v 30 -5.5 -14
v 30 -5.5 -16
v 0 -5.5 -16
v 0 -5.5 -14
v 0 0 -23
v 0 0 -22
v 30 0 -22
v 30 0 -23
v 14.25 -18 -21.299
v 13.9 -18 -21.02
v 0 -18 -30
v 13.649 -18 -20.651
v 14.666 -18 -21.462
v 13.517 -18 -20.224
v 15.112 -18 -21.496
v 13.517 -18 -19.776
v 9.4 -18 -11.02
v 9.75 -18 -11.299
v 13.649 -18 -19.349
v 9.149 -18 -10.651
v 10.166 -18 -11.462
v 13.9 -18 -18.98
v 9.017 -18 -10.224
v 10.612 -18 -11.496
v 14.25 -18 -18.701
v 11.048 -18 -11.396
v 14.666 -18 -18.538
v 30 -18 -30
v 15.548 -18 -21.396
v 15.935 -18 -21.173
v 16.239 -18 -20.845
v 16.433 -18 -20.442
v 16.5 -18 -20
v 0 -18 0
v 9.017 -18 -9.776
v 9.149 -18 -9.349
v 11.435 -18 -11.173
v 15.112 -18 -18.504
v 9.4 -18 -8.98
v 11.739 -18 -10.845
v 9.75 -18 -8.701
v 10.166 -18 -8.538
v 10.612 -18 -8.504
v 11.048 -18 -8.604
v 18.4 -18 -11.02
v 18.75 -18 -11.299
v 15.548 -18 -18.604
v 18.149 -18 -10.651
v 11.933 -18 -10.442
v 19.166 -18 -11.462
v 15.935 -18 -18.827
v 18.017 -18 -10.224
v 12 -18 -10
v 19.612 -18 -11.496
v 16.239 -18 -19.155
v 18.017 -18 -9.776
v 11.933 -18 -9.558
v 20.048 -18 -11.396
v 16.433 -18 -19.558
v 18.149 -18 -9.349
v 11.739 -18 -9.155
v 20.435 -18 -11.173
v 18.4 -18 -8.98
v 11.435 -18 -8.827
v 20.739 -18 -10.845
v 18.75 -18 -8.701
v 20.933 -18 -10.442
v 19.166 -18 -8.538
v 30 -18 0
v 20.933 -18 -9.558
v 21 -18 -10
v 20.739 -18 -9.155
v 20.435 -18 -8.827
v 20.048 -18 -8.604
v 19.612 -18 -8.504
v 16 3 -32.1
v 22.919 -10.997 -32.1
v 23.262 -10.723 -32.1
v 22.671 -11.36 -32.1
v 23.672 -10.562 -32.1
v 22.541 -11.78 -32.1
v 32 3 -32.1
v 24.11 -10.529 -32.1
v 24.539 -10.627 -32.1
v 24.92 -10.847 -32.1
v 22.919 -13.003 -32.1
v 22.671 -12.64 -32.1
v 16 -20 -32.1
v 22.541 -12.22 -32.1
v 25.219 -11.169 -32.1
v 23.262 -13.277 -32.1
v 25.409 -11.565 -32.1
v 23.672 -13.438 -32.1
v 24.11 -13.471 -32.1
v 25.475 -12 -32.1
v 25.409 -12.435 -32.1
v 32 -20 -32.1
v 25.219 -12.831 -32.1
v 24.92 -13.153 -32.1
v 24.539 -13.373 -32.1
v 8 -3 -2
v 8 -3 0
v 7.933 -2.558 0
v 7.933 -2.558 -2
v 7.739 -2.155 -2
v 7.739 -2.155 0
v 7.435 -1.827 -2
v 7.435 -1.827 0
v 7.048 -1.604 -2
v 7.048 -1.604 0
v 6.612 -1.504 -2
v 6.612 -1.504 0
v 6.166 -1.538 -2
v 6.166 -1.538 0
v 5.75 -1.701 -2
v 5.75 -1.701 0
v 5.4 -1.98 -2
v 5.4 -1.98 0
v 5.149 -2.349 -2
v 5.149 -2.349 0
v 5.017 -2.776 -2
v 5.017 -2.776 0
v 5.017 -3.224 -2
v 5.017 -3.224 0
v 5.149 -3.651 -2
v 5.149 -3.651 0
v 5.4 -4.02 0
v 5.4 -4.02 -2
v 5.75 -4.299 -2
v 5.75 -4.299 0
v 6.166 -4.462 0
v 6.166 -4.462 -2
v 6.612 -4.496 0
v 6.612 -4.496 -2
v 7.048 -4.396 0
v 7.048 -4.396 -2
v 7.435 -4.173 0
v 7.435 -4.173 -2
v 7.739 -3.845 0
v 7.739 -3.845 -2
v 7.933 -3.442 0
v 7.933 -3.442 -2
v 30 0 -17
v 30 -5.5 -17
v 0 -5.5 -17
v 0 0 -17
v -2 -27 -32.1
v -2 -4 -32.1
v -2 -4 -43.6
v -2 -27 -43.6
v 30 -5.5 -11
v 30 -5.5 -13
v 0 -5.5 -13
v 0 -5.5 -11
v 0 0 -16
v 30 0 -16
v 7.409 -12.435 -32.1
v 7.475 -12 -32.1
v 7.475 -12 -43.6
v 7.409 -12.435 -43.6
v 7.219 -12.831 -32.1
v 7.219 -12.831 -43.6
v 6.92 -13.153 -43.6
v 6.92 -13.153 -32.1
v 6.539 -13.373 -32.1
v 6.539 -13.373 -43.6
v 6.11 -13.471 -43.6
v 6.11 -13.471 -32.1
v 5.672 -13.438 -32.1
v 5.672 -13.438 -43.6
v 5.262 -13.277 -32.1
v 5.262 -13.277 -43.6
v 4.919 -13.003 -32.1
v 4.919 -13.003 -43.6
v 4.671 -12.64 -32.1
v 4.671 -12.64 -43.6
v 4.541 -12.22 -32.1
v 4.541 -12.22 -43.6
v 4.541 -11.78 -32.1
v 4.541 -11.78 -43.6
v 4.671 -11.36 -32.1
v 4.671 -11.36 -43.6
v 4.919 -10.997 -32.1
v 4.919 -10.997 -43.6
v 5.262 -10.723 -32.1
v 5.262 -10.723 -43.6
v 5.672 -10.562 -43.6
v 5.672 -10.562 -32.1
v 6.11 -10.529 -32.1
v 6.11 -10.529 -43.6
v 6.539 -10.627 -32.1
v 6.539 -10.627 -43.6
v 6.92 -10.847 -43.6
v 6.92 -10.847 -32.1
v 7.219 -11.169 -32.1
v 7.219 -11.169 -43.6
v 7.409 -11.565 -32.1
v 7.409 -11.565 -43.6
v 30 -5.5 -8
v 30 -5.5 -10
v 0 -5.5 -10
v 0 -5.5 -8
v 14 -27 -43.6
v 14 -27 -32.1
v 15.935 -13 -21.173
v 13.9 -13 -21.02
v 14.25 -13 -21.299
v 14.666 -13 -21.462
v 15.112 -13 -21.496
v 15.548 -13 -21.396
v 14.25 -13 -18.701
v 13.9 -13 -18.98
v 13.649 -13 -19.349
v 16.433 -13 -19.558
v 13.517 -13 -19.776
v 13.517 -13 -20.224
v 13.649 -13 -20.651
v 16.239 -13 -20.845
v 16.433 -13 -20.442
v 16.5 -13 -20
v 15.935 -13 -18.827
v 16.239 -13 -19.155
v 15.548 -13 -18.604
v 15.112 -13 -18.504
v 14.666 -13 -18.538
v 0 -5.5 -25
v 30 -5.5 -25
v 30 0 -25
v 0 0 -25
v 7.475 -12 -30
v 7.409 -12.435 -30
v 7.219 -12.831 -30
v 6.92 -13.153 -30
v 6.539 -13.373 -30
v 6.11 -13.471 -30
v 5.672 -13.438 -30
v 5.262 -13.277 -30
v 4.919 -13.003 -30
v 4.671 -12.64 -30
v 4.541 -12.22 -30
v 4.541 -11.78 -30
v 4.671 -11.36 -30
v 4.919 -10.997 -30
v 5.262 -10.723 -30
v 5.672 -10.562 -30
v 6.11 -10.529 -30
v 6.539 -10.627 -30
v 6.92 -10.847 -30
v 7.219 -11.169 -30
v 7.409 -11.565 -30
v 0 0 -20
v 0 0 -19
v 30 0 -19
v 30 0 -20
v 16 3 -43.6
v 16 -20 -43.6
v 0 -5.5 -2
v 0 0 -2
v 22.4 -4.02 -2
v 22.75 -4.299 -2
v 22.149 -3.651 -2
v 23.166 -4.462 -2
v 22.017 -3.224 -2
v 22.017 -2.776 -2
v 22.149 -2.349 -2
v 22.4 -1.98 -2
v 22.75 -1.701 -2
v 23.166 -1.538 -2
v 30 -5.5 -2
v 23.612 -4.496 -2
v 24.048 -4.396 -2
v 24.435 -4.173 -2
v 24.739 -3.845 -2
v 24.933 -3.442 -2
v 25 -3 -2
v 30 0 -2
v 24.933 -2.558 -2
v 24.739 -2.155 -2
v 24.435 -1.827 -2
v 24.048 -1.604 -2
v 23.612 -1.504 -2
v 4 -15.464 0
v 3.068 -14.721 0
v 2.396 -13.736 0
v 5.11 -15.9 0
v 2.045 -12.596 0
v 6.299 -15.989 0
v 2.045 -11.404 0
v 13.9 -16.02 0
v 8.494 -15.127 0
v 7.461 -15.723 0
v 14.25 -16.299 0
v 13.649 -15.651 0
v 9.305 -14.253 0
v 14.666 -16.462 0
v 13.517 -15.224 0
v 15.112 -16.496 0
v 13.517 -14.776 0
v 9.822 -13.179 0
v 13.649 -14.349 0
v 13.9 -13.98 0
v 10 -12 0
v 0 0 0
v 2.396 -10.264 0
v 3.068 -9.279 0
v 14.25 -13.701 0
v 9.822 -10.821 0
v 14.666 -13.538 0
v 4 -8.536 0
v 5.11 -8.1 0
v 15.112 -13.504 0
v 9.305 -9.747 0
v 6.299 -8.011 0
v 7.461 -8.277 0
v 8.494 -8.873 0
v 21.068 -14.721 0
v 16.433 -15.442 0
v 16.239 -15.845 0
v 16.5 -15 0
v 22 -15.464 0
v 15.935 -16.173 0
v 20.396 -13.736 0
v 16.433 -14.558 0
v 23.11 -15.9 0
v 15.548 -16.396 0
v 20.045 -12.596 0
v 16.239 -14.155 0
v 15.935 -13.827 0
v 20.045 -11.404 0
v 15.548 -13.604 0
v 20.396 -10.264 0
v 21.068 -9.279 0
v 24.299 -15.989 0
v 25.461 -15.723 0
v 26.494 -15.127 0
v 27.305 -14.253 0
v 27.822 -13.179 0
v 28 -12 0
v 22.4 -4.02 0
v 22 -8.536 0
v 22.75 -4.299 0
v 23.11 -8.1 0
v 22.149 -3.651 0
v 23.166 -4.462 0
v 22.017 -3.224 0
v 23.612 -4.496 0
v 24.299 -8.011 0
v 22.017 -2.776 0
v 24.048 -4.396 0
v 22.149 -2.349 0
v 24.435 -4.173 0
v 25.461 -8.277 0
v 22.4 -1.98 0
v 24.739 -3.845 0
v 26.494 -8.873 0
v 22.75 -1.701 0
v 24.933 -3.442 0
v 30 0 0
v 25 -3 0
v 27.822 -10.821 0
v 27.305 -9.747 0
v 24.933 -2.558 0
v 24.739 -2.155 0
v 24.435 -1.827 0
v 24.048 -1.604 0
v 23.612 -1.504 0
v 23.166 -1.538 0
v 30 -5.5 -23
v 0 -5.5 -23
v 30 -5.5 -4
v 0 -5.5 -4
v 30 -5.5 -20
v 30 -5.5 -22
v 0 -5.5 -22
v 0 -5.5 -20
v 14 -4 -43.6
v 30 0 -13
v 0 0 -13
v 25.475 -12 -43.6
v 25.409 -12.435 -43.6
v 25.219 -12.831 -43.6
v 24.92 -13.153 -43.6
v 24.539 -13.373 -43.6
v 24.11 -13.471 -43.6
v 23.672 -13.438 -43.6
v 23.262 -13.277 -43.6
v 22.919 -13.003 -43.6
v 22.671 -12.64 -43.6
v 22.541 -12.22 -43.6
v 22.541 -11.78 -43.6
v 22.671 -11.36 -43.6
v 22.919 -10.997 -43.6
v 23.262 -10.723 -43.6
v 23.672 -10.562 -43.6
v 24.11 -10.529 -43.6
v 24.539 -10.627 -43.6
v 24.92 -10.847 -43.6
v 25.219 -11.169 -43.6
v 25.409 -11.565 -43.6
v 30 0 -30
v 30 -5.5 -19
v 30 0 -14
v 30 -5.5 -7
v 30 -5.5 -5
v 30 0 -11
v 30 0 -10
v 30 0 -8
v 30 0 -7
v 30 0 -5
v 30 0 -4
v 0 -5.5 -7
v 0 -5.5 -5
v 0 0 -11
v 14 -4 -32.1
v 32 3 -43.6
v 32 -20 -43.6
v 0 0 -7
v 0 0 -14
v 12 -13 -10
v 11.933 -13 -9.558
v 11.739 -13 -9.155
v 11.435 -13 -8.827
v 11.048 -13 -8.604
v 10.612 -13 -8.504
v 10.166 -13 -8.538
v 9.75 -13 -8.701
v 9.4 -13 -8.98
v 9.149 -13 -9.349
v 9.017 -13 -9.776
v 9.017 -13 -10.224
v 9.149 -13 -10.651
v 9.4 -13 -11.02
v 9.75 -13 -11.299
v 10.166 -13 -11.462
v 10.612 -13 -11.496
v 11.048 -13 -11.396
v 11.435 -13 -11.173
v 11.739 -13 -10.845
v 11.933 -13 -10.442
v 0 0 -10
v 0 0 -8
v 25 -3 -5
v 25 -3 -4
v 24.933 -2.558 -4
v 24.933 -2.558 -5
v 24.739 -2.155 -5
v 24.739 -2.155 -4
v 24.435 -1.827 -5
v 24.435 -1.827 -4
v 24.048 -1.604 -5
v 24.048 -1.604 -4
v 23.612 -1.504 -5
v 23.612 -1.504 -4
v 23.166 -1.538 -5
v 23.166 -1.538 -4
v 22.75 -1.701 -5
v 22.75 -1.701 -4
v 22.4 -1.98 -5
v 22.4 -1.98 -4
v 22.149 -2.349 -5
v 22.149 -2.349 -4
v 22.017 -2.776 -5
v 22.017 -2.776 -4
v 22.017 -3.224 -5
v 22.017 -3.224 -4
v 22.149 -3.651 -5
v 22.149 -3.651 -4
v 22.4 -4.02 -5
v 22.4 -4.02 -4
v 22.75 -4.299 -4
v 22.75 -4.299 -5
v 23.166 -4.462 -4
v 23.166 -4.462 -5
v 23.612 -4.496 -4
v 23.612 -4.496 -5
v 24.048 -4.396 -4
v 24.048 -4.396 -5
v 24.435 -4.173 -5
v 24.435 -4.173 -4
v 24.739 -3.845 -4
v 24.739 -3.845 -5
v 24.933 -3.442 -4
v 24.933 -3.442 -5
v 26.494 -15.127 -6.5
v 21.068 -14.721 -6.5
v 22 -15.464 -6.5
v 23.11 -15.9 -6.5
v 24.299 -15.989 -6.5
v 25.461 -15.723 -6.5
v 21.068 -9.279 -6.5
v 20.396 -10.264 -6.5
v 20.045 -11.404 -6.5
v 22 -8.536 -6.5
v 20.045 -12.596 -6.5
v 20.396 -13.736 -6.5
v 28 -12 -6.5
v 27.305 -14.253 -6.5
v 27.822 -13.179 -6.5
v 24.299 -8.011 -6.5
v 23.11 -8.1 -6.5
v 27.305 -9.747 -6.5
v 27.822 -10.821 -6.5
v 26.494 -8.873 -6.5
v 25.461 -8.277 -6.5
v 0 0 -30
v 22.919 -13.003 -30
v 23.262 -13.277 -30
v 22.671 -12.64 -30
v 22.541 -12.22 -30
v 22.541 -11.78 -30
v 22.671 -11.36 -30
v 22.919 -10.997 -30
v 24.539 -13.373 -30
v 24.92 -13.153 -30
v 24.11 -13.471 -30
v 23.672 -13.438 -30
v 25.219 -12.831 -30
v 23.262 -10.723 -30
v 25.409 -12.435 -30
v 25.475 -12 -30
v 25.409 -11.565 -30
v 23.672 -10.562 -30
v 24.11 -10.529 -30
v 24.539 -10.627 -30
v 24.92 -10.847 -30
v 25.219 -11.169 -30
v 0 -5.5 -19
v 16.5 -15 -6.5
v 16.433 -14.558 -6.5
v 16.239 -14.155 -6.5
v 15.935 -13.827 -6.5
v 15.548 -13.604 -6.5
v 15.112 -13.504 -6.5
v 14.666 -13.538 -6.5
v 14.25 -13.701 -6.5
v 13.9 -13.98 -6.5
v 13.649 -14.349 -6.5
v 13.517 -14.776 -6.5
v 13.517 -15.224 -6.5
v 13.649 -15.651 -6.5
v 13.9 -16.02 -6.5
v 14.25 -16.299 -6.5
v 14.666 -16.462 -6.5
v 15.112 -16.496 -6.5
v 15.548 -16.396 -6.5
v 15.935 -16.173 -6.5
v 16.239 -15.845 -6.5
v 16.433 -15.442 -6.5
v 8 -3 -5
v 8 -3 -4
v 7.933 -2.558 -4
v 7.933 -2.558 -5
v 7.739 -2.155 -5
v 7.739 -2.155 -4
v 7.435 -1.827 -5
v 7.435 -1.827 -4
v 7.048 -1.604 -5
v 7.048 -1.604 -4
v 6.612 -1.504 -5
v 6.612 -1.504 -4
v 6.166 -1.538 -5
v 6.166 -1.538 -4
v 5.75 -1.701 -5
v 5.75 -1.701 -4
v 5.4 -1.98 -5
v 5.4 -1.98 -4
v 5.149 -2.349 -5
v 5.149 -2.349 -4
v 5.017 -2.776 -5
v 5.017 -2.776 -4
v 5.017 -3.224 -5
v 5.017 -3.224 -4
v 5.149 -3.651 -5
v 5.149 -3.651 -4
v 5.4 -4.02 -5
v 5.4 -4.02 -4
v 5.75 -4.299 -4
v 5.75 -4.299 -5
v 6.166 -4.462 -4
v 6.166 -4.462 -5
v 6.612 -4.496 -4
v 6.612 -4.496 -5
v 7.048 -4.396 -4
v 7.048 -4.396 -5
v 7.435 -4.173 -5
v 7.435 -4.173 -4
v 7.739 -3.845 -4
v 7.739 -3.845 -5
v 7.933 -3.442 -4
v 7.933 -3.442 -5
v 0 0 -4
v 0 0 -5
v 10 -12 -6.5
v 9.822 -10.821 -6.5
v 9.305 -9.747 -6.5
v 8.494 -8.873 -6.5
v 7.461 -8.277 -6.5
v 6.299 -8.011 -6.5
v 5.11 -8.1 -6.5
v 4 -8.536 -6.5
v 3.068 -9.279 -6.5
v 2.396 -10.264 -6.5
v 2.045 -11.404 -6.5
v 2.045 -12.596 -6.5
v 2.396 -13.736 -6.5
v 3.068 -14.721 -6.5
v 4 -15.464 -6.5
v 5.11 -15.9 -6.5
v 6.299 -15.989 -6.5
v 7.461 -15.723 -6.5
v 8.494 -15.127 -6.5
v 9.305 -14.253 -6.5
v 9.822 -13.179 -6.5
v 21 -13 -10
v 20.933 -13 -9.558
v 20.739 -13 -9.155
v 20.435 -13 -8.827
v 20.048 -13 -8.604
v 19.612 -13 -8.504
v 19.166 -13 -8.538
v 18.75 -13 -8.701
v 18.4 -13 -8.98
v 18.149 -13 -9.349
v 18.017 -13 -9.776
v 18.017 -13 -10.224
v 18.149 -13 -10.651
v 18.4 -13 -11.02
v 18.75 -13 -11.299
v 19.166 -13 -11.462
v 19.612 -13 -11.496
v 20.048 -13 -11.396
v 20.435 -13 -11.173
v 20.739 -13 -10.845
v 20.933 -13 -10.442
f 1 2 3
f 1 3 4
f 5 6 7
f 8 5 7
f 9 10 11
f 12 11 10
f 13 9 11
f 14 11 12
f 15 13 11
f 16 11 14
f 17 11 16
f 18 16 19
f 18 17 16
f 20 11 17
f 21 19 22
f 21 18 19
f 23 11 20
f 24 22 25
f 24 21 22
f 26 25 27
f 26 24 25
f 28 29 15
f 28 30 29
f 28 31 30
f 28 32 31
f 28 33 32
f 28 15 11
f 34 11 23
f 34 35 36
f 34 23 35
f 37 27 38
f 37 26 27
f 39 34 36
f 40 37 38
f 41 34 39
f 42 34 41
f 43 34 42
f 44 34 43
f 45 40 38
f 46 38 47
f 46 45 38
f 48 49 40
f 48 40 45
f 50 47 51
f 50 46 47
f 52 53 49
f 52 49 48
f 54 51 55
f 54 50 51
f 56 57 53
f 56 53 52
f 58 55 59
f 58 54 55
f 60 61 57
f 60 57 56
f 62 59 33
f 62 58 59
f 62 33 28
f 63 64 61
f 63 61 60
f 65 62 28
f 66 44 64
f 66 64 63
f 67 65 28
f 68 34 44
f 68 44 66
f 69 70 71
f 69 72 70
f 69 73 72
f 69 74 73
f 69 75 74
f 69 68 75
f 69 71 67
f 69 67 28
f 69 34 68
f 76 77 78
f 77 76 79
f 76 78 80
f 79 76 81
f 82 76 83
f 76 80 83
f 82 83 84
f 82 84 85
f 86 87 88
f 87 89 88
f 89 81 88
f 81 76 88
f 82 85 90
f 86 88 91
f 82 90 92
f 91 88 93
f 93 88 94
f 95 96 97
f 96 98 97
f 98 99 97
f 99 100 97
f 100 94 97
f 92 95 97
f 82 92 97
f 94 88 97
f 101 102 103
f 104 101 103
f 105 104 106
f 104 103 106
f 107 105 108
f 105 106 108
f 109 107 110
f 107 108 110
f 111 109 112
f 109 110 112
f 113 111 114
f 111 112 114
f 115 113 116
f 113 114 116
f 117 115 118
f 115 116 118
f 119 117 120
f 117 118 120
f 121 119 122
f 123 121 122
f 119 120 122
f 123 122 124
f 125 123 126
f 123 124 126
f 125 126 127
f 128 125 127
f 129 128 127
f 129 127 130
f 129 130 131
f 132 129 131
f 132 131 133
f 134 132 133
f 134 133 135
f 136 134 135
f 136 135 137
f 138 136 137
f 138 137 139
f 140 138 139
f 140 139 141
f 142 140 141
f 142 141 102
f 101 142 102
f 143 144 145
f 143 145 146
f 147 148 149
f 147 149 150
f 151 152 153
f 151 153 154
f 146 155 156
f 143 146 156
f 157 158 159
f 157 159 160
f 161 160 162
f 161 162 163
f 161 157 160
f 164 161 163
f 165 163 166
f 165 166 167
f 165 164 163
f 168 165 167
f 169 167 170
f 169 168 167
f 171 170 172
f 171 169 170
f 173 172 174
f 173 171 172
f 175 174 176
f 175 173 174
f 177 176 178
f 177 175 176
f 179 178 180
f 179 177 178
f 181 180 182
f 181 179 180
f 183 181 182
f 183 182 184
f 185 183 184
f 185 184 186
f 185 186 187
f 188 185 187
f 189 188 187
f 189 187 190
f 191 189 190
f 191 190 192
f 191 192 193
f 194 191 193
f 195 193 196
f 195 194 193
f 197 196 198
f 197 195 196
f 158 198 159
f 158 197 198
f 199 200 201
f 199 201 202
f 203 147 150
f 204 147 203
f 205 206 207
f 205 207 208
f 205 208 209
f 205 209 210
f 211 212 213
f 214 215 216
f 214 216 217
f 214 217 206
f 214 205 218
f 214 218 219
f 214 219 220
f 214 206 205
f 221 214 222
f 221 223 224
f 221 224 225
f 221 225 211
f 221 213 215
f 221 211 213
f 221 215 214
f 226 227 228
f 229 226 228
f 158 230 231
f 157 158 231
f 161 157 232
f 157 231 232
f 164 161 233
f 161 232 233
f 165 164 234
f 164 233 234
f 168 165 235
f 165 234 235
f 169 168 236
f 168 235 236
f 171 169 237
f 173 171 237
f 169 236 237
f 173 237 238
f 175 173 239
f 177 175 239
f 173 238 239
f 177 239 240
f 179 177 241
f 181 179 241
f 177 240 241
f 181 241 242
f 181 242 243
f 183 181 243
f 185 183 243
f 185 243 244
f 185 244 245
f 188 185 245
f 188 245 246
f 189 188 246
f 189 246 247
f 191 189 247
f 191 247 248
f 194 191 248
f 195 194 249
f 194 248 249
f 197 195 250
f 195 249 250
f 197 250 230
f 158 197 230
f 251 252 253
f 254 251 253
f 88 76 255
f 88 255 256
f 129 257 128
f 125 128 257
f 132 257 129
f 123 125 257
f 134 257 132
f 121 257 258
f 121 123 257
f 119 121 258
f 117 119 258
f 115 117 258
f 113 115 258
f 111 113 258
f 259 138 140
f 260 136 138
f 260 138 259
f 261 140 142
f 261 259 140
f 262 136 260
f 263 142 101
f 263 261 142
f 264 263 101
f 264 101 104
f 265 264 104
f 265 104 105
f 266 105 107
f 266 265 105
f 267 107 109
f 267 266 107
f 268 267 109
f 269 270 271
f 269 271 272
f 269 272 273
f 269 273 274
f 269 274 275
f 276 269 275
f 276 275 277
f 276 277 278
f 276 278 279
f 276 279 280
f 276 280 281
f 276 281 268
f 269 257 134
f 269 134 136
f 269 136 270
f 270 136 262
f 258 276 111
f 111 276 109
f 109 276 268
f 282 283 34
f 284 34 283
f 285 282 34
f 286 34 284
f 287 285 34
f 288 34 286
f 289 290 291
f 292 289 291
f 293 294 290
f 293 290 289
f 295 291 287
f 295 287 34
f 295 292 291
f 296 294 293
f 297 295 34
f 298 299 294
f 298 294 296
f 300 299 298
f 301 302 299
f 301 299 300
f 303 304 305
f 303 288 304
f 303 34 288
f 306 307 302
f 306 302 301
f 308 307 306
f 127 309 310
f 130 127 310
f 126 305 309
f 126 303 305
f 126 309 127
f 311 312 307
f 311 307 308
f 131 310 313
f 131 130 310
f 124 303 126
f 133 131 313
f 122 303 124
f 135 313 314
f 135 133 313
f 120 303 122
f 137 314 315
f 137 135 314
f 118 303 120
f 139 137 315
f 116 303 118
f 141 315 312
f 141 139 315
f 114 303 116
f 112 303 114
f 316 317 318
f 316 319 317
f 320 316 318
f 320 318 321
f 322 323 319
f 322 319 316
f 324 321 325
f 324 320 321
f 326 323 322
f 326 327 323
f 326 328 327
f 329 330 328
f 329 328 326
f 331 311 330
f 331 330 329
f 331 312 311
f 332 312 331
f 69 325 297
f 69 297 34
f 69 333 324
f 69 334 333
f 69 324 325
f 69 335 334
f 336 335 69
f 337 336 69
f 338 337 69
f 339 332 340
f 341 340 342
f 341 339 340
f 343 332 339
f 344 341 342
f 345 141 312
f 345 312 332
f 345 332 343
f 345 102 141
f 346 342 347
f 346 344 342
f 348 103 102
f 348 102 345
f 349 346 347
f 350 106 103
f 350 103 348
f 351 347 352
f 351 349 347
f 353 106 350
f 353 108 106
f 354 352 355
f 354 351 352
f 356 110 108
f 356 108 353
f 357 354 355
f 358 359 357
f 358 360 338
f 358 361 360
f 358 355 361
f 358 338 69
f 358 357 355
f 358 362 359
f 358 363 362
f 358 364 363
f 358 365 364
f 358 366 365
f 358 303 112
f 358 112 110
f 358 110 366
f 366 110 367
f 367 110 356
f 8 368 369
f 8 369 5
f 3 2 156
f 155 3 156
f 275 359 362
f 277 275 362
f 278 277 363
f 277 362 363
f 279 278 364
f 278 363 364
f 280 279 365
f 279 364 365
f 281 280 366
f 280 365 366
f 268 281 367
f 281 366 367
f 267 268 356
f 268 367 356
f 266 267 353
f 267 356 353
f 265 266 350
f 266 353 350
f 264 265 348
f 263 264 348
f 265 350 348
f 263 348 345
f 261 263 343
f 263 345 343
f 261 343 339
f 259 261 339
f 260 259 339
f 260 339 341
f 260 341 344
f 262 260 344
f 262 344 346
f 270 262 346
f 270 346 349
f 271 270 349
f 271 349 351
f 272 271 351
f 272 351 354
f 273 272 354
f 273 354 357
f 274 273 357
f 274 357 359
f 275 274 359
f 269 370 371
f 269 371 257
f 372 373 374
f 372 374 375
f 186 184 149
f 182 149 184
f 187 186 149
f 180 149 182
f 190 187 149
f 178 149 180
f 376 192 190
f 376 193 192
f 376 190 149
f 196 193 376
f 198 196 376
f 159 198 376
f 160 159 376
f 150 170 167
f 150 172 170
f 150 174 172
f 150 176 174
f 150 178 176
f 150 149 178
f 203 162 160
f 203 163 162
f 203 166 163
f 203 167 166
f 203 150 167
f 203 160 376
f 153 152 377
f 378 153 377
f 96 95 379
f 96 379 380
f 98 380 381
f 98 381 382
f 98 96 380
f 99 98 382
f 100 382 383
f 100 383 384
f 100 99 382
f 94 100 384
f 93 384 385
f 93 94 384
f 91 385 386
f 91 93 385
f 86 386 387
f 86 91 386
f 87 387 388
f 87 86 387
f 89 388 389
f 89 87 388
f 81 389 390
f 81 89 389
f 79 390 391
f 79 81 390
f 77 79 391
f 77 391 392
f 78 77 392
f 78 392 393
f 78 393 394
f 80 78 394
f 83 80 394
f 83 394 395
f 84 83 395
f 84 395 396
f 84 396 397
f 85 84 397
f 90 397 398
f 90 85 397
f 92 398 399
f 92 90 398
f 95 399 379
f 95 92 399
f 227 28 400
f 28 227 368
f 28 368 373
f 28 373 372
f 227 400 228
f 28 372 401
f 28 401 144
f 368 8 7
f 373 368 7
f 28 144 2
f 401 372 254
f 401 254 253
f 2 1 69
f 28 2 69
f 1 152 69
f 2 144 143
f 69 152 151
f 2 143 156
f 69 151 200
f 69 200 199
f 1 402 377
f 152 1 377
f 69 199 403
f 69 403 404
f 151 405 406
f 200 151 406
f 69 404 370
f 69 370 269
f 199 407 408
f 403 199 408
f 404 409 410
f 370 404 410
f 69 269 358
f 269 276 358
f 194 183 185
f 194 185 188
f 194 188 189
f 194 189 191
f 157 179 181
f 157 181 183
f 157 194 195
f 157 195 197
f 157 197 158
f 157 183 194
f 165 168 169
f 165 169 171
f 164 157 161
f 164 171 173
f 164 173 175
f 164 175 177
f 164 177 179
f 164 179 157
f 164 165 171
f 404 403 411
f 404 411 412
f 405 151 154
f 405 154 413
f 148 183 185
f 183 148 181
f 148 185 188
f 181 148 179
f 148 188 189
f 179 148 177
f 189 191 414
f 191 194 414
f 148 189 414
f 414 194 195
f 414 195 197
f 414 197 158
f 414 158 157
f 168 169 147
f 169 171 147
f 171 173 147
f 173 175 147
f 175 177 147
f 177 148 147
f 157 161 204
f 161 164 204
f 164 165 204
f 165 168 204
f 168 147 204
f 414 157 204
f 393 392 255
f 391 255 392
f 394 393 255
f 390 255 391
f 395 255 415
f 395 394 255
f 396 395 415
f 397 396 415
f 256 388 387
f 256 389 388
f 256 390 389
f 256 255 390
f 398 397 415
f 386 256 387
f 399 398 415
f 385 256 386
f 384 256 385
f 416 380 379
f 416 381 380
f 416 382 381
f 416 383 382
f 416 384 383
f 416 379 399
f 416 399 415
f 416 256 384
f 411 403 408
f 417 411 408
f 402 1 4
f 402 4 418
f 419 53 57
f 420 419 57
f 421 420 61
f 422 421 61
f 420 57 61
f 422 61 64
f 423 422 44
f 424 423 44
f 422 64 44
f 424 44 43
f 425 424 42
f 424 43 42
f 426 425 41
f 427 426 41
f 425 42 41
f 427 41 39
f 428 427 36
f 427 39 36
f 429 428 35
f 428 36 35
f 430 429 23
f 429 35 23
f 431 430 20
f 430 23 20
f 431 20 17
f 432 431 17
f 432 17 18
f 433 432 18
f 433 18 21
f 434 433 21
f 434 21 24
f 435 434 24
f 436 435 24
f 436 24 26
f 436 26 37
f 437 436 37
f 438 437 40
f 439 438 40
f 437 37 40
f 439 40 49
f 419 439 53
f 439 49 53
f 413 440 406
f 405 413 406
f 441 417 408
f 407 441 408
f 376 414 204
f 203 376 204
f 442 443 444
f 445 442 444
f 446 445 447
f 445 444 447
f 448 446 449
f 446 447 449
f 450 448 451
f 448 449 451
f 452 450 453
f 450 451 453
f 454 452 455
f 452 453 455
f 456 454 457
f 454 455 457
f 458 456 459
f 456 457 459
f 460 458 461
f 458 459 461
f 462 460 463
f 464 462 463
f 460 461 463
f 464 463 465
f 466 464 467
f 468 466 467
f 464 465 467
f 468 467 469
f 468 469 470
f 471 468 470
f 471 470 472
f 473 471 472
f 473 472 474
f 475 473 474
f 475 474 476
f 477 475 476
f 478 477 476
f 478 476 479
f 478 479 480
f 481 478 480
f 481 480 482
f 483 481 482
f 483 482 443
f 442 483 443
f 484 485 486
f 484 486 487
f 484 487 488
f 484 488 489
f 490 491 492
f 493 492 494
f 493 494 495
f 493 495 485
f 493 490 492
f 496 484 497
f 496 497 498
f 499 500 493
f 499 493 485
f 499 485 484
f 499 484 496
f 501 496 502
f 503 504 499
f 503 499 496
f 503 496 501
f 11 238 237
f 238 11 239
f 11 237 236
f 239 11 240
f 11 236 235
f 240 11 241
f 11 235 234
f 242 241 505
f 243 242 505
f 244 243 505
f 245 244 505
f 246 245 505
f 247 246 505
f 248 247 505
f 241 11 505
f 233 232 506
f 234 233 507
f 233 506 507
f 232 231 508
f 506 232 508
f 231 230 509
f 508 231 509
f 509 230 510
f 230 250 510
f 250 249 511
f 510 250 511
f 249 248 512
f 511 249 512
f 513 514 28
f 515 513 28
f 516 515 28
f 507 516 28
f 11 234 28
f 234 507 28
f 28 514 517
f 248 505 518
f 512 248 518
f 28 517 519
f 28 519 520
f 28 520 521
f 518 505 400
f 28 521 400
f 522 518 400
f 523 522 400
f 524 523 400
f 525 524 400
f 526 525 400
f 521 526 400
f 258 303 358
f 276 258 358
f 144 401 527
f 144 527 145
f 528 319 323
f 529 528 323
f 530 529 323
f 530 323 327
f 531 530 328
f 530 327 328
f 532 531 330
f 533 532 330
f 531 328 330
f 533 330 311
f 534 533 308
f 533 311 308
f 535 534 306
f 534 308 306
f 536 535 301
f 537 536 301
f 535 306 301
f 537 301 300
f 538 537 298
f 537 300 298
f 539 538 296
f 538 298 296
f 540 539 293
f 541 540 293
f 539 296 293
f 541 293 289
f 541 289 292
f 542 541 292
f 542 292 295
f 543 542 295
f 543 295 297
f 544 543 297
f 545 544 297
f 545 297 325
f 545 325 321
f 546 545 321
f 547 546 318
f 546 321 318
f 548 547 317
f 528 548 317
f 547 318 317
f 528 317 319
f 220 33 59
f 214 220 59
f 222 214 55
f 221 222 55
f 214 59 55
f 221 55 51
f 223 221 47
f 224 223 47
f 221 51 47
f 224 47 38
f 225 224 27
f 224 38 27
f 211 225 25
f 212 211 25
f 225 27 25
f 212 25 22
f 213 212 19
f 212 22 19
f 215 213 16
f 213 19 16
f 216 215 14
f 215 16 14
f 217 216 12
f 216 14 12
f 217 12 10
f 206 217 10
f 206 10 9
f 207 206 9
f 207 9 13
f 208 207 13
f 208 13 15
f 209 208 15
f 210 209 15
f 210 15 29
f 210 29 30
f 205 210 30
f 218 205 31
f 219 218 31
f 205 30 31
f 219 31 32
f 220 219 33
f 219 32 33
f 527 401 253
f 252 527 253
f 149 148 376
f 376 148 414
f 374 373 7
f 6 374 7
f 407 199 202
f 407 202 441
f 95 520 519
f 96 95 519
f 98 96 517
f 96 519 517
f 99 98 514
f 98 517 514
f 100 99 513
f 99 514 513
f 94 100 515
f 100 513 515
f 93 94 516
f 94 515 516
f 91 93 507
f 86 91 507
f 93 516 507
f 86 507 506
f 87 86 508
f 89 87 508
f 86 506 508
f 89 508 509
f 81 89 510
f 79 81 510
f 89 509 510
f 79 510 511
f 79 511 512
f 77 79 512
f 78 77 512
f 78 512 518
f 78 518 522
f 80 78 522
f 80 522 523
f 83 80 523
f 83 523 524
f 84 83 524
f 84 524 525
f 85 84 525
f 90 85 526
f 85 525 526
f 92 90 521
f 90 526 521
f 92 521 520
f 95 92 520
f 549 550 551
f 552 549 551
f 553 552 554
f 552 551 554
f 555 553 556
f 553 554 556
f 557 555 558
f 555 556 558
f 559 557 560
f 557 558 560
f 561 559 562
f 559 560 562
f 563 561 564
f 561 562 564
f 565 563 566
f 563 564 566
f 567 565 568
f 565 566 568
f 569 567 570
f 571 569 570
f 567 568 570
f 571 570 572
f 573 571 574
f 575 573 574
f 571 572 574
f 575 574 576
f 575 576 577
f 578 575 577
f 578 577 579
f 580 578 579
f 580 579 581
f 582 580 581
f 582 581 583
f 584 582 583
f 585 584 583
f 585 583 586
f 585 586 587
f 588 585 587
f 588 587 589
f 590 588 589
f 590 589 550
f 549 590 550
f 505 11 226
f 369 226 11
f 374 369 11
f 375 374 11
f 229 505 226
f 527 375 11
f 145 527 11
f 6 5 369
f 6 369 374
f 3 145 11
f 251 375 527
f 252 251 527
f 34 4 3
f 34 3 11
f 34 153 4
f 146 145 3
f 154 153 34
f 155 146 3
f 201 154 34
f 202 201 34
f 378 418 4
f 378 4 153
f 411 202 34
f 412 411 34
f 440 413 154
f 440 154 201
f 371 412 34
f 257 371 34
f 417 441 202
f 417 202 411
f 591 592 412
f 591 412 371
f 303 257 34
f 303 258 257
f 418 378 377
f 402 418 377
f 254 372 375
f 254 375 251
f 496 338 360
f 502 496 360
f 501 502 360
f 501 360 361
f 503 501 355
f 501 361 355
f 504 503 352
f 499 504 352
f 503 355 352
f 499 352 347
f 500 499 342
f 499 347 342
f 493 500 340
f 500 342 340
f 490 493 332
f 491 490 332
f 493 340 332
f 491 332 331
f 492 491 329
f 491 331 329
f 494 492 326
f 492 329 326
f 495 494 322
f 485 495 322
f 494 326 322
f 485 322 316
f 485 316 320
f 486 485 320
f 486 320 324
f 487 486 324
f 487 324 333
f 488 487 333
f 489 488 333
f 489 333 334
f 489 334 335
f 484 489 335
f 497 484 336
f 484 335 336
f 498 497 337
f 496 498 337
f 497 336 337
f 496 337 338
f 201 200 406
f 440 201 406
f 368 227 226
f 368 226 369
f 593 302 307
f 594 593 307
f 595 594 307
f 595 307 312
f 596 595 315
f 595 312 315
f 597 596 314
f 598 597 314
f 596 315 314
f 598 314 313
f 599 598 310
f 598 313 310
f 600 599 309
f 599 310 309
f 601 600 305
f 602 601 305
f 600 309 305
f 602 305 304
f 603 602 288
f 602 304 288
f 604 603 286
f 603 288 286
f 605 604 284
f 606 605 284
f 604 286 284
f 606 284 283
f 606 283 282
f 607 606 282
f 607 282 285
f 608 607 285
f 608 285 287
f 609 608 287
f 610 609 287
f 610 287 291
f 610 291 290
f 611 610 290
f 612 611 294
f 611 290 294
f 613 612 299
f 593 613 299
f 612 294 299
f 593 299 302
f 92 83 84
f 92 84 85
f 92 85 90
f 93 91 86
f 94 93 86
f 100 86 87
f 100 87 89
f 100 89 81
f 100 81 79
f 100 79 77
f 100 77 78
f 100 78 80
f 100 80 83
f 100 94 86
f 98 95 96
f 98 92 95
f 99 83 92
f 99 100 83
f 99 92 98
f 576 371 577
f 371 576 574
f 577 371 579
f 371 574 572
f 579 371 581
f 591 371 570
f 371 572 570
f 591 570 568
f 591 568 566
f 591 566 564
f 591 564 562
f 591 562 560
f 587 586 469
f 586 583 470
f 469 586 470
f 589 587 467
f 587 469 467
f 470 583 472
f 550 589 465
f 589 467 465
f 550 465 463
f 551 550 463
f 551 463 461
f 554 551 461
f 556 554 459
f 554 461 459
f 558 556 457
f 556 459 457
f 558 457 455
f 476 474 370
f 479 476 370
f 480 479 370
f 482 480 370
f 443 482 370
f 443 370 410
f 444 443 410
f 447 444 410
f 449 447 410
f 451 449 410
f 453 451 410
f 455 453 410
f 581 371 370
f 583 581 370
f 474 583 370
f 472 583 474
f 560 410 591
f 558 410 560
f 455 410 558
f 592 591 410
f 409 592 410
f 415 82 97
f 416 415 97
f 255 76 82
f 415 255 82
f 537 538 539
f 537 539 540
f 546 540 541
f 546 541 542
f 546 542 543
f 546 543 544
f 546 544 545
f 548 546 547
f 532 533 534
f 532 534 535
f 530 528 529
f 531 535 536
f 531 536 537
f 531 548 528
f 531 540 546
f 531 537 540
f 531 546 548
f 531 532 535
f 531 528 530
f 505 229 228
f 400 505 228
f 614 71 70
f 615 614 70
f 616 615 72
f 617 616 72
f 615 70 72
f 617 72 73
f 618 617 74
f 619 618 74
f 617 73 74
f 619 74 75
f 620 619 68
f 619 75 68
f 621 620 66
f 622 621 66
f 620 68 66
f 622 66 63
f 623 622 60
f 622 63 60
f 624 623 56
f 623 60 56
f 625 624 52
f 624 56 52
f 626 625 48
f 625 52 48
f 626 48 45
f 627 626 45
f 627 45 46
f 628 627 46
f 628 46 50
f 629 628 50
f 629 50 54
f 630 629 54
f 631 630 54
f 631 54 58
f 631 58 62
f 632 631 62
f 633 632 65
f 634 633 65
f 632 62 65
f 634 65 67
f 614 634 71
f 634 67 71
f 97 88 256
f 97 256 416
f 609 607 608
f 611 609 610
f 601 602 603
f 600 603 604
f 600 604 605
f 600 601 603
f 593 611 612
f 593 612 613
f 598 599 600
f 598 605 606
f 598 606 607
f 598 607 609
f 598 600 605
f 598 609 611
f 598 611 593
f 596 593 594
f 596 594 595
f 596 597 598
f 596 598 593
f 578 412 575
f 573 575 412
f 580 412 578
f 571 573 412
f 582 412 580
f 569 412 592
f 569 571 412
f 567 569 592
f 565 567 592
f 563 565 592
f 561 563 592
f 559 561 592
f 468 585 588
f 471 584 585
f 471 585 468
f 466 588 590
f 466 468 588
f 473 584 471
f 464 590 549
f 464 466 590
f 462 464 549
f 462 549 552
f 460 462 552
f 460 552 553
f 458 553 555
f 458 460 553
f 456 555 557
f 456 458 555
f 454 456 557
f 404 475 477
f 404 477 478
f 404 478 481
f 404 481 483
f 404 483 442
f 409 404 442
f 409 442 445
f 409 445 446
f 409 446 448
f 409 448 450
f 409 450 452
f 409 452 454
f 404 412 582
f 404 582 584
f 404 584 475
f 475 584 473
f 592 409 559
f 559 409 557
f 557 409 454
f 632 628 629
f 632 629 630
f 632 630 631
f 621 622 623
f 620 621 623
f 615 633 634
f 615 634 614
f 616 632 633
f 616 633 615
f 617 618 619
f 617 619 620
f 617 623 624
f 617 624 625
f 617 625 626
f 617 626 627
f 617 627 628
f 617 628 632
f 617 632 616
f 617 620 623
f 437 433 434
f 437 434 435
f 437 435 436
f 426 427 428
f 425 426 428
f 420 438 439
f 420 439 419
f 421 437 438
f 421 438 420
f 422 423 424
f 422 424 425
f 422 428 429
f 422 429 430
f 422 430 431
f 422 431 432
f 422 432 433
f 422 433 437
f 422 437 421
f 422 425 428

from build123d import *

# Parameters (mm, degrees)
F0_W      = 30
F0_H      = 30
F1_DEPTH  = 18
F2_R      = 4
F2_R_2    = 1.5
F3_DEPTH  = 6.5
F4_R      = 1.5
F5_DEPTH  = 5
F6_W      = 5.5
F6_H      = 2
F7_DEPTH  = 30
F8_R      = 1.475
F9_DEPTH  = 2.1
F10_W     = 16
F10_H     = 23
F10_R     = 1.475
F11_W     = 16
F11_H     = 23
F11_R     = 1.475
F12_DEPTH = 11.5


with BuildPart() as f1:
    # F0 (on Front) → F1 (new body)
    with BuildSketch(Plane.XZ):
        with Locations((15, -15)):
            Rectangle(F0_W, F0_H)
    extrude(amount=F1_DEPTH)

    # F2 (on face) → F3 (cut)
    with BuildSketch(Plane.XY):
        with Locations((6, -12)):
            Circle(F2_R)
        with Locations((24, -12)):
            Circle(F2_R)
        with Locations((6.5, -3)):
            Circle(F2_R_2)
        with Locations((23.5, -3)):
            Circle(F2_R_2)
        with Locations((15, -15)):
            Circle(F2_R_2)
    extrude(amount=-F3_DEPTH, mode=Mode.SUBTRACT)

    # F4 (on face) → F5 (cut)
    with BuildSketch(Plane.XZ.offset(18)):
        with Locations((19.5, -10)):
            Circle(F4_R)
        with Locations((15, -20)):
            Circle(F4_R)
        with Locations((10.5, -10)):
            Circle(F4_R)
    extrude(amount=-F5_DEPTH, mode=Mode.SUBTRACT)

    # F6 (on face) → F7 (cut, through all)
    with BuildSketch(Plane.YZ.offset(30)):
        with Locations((-2.75, -3)):
            Rectangle(F6_W, F6_H)
        with Locations((-2.75, -6)):
            Rectangle(F6_W, F6_H)
        with Locations((-2.75, -9)):
            Rectangle(F6_W, F6_H)
        with Locations((-2.75, -12)):
            Rectangle(F6_W, F6_H)
        with Locations((-2.75, -15)):
            Rectangle(F6_W, F6_H)
        with Locations((-2.75, -18)):
            Rectangle(F6_W, F6_H)
        with Locations((-2.75, -21)):
            Rectangle(F6_W, F6_H)
        with Locations((-2.75, -24)):
            Rectangle(F6_W, F6_H)
    extrude(amount=-F7_DEPTH, mode=Mode.SUBTRACT)

    # F8 (on face) → F9 (join)
    with BuildSketch(Plane(origin=(0, 0, -30), x_dir=(1, 0, 0), z_dir=(0, 0, -1))):
        with Locations((6, 12)):
            Circle(F8_R)
        with Locations((24, 12)):
            Circle(F8_R)
    extrude(amount=F9_DEPTH)

    # F10 (on face) + F11 (on face) → F12 (join)
    with BuildSketch(Plane(origin=(0, 0, -32.1), x_dir=(1, 0, 0), z_dir=(0, 0, -1))):
        with Locations((24, 8.5)):
            Rectangle(F10_W, F10_H)
        with Locations((24, 12)):
            Circle(F10_R, mode=Mode.SUBTRACT)
    with BuildSketch(Plane(origin=(0, 0, -32.1), x_dir=(1, 0, 0), z_dir=(0, 0, -1))):
        with Locations((6, 15.5)):
            Rectangle(F11_W, F11_H)
        with Locations((6, 12)):
            Circle(F11_R, mode=Mode.SUBTRACT)
    extrude(amount=F12_DEPTH)


solid = f1.part
